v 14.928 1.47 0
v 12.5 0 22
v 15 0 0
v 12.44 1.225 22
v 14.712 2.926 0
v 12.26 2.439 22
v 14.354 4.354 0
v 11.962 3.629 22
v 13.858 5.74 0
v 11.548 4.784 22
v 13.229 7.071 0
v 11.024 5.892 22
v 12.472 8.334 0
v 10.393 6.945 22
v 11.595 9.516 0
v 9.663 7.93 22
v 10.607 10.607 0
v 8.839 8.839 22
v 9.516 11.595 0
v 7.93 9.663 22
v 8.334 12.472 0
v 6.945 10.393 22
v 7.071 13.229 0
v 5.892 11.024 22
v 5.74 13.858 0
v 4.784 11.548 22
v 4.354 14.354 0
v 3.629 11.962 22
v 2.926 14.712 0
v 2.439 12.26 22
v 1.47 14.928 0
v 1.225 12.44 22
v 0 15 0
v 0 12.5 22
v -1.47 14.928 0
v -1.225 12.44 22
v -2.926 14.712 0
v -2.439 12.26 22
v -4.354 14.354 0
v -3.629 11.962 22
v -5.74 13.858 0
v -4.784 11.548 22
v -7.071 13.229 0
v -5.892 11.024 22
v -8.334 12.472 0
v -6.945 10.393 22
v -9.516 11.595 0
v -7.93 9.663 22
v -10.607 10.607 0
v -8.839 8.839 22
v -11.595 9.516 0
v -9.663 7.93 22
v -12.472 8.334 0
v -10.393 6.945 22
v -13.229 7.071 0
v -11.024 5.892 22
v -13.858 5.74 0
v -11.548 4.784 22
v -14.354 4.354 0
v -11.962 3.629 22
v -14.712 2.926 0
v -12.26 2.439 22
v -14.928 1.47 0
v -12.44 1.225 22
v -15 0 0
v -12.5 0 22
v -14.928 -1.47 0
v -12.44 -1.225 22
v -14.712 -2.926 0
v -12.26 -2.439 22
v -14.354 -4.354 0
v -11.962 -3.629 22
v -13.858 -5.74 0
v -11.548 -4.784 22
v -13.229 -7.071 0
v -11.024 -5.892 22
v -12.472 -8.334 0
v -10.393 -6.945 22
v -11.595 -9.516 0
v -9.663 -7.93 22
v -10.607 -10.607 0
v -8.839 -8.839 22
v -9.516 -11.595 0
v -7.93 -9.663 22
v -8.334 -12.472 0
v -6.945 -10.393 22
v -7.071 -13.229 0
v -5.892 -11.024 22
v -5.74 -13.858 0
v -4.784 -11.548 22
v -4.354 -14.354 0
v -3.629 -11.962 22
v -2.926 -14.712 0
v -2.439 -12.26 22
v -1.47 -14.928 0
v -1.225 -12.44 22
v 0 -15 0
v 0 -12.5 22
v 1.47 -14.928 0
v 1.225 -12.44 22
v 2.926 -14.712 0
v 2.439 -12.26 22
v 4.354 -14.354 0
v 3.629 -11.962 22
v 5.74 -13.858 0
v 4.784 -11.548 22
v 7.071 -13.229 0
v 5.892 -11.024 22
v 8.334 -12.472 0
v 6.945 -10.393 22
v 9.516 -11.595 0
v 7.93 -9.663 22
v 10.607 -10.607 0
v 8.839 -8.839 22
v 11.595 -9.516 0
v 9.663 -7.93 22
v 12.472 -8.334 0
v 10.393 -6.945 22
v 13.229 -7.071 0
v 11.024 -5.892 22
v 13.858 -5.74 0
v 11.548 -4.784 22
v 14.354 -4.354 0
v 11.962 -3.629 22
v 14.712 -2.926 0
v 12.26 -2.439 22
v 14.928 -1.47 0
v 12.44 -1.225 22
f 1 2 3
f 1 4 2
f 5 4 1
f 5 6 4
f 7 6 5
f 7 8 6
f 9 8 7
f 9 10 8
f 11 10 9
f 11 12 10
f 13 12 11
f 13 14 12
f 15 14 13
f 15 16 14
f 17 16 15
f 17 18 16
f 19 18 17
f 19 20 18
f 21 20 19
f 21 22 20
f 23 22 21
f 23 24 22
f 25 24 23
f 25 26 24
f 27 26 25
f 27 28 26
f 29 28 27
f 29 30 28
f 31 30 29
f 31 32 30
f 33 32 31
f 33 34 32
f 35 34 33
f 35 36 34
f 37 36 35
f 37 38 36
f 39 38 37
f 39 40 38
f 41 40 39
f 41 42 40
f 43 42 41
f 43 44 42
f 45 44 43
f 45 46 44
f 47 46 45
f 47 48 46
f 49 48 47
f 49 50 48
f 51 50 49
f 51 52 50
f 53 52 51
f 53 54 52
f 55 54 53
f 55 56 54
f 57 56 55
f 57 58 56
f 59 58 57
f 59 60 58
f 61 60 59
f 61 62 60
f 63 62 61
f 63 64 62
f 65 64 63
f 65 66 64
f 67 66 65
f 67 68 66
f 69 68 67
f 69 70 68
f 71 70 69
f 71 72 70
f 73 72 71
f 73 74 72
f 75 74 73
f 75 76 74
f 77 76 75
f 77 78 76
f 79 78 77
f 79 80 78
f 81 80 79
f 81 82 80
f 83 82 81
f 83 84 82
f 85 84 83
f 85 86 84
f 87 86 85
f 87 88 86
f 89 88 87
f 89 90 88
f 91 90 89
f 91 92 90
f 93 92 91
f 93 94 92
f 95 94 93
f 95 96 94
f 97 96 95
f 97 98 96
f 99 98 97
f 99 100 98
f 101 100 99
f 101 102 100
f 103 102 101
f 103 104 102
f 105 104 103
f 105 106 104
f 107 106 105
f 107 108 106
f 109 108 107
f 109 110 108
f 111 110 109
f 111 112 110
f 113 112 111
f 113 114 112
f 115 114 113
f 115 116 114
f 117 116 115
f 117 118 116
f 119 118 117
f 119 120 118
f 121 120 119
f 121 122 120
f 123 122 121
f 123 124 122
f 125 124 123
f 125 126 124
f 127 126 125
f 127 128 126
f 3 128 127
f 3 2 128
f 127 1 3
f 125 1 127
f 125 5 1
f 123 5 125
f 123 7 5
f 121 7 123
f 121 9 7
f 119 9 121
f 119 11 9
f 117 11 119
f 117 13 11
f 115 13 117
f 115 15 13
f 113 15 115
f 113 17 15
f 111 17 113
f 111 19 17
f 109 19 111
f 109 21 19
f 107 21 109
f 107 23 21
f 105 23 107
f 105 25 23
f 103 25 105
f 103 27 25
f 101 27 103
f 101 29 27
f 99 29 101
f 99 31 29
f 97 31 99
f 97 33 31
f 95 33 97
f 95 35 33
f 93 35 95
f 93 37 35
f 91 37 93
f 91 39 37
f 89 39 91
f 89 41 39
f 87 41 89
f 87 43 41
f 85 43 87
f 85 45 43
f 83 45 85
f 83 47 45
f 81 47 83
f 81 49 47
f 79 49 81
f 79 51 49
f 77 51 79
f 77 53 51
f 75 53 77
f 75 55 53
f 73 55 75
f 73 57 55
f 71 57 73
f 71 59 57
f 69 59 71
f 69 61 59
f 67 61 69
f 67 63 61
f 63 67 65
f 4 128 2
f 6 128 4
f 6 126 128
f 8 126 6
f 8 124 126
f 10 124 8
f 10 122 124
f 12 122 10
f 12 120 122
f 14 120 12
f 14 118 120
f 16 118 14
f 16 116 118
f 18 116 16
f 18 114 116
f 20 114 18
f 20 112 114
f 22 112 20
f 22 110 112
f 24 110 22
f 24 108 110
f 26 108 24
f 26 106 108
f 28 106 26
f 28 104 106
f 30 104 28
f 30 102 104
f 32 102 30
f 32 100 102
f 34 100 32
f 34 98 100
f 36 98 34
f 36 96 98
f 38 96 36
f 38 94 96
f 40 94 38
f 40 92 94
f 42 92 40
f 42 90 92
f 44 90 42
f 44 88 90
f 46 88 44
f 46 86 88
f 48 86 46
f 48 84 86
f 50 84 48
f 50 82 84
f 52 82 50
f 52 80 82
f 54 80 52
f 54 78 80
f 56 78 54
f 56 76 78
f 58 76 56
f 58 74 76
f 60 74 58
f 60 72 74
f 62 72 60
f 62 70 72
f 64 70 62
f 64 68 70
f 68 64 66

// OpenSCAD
height = 21;
d1 = 30;
d2 = 25;

cylinder(d1=d1,d2=25,h=22,$fn=64);
